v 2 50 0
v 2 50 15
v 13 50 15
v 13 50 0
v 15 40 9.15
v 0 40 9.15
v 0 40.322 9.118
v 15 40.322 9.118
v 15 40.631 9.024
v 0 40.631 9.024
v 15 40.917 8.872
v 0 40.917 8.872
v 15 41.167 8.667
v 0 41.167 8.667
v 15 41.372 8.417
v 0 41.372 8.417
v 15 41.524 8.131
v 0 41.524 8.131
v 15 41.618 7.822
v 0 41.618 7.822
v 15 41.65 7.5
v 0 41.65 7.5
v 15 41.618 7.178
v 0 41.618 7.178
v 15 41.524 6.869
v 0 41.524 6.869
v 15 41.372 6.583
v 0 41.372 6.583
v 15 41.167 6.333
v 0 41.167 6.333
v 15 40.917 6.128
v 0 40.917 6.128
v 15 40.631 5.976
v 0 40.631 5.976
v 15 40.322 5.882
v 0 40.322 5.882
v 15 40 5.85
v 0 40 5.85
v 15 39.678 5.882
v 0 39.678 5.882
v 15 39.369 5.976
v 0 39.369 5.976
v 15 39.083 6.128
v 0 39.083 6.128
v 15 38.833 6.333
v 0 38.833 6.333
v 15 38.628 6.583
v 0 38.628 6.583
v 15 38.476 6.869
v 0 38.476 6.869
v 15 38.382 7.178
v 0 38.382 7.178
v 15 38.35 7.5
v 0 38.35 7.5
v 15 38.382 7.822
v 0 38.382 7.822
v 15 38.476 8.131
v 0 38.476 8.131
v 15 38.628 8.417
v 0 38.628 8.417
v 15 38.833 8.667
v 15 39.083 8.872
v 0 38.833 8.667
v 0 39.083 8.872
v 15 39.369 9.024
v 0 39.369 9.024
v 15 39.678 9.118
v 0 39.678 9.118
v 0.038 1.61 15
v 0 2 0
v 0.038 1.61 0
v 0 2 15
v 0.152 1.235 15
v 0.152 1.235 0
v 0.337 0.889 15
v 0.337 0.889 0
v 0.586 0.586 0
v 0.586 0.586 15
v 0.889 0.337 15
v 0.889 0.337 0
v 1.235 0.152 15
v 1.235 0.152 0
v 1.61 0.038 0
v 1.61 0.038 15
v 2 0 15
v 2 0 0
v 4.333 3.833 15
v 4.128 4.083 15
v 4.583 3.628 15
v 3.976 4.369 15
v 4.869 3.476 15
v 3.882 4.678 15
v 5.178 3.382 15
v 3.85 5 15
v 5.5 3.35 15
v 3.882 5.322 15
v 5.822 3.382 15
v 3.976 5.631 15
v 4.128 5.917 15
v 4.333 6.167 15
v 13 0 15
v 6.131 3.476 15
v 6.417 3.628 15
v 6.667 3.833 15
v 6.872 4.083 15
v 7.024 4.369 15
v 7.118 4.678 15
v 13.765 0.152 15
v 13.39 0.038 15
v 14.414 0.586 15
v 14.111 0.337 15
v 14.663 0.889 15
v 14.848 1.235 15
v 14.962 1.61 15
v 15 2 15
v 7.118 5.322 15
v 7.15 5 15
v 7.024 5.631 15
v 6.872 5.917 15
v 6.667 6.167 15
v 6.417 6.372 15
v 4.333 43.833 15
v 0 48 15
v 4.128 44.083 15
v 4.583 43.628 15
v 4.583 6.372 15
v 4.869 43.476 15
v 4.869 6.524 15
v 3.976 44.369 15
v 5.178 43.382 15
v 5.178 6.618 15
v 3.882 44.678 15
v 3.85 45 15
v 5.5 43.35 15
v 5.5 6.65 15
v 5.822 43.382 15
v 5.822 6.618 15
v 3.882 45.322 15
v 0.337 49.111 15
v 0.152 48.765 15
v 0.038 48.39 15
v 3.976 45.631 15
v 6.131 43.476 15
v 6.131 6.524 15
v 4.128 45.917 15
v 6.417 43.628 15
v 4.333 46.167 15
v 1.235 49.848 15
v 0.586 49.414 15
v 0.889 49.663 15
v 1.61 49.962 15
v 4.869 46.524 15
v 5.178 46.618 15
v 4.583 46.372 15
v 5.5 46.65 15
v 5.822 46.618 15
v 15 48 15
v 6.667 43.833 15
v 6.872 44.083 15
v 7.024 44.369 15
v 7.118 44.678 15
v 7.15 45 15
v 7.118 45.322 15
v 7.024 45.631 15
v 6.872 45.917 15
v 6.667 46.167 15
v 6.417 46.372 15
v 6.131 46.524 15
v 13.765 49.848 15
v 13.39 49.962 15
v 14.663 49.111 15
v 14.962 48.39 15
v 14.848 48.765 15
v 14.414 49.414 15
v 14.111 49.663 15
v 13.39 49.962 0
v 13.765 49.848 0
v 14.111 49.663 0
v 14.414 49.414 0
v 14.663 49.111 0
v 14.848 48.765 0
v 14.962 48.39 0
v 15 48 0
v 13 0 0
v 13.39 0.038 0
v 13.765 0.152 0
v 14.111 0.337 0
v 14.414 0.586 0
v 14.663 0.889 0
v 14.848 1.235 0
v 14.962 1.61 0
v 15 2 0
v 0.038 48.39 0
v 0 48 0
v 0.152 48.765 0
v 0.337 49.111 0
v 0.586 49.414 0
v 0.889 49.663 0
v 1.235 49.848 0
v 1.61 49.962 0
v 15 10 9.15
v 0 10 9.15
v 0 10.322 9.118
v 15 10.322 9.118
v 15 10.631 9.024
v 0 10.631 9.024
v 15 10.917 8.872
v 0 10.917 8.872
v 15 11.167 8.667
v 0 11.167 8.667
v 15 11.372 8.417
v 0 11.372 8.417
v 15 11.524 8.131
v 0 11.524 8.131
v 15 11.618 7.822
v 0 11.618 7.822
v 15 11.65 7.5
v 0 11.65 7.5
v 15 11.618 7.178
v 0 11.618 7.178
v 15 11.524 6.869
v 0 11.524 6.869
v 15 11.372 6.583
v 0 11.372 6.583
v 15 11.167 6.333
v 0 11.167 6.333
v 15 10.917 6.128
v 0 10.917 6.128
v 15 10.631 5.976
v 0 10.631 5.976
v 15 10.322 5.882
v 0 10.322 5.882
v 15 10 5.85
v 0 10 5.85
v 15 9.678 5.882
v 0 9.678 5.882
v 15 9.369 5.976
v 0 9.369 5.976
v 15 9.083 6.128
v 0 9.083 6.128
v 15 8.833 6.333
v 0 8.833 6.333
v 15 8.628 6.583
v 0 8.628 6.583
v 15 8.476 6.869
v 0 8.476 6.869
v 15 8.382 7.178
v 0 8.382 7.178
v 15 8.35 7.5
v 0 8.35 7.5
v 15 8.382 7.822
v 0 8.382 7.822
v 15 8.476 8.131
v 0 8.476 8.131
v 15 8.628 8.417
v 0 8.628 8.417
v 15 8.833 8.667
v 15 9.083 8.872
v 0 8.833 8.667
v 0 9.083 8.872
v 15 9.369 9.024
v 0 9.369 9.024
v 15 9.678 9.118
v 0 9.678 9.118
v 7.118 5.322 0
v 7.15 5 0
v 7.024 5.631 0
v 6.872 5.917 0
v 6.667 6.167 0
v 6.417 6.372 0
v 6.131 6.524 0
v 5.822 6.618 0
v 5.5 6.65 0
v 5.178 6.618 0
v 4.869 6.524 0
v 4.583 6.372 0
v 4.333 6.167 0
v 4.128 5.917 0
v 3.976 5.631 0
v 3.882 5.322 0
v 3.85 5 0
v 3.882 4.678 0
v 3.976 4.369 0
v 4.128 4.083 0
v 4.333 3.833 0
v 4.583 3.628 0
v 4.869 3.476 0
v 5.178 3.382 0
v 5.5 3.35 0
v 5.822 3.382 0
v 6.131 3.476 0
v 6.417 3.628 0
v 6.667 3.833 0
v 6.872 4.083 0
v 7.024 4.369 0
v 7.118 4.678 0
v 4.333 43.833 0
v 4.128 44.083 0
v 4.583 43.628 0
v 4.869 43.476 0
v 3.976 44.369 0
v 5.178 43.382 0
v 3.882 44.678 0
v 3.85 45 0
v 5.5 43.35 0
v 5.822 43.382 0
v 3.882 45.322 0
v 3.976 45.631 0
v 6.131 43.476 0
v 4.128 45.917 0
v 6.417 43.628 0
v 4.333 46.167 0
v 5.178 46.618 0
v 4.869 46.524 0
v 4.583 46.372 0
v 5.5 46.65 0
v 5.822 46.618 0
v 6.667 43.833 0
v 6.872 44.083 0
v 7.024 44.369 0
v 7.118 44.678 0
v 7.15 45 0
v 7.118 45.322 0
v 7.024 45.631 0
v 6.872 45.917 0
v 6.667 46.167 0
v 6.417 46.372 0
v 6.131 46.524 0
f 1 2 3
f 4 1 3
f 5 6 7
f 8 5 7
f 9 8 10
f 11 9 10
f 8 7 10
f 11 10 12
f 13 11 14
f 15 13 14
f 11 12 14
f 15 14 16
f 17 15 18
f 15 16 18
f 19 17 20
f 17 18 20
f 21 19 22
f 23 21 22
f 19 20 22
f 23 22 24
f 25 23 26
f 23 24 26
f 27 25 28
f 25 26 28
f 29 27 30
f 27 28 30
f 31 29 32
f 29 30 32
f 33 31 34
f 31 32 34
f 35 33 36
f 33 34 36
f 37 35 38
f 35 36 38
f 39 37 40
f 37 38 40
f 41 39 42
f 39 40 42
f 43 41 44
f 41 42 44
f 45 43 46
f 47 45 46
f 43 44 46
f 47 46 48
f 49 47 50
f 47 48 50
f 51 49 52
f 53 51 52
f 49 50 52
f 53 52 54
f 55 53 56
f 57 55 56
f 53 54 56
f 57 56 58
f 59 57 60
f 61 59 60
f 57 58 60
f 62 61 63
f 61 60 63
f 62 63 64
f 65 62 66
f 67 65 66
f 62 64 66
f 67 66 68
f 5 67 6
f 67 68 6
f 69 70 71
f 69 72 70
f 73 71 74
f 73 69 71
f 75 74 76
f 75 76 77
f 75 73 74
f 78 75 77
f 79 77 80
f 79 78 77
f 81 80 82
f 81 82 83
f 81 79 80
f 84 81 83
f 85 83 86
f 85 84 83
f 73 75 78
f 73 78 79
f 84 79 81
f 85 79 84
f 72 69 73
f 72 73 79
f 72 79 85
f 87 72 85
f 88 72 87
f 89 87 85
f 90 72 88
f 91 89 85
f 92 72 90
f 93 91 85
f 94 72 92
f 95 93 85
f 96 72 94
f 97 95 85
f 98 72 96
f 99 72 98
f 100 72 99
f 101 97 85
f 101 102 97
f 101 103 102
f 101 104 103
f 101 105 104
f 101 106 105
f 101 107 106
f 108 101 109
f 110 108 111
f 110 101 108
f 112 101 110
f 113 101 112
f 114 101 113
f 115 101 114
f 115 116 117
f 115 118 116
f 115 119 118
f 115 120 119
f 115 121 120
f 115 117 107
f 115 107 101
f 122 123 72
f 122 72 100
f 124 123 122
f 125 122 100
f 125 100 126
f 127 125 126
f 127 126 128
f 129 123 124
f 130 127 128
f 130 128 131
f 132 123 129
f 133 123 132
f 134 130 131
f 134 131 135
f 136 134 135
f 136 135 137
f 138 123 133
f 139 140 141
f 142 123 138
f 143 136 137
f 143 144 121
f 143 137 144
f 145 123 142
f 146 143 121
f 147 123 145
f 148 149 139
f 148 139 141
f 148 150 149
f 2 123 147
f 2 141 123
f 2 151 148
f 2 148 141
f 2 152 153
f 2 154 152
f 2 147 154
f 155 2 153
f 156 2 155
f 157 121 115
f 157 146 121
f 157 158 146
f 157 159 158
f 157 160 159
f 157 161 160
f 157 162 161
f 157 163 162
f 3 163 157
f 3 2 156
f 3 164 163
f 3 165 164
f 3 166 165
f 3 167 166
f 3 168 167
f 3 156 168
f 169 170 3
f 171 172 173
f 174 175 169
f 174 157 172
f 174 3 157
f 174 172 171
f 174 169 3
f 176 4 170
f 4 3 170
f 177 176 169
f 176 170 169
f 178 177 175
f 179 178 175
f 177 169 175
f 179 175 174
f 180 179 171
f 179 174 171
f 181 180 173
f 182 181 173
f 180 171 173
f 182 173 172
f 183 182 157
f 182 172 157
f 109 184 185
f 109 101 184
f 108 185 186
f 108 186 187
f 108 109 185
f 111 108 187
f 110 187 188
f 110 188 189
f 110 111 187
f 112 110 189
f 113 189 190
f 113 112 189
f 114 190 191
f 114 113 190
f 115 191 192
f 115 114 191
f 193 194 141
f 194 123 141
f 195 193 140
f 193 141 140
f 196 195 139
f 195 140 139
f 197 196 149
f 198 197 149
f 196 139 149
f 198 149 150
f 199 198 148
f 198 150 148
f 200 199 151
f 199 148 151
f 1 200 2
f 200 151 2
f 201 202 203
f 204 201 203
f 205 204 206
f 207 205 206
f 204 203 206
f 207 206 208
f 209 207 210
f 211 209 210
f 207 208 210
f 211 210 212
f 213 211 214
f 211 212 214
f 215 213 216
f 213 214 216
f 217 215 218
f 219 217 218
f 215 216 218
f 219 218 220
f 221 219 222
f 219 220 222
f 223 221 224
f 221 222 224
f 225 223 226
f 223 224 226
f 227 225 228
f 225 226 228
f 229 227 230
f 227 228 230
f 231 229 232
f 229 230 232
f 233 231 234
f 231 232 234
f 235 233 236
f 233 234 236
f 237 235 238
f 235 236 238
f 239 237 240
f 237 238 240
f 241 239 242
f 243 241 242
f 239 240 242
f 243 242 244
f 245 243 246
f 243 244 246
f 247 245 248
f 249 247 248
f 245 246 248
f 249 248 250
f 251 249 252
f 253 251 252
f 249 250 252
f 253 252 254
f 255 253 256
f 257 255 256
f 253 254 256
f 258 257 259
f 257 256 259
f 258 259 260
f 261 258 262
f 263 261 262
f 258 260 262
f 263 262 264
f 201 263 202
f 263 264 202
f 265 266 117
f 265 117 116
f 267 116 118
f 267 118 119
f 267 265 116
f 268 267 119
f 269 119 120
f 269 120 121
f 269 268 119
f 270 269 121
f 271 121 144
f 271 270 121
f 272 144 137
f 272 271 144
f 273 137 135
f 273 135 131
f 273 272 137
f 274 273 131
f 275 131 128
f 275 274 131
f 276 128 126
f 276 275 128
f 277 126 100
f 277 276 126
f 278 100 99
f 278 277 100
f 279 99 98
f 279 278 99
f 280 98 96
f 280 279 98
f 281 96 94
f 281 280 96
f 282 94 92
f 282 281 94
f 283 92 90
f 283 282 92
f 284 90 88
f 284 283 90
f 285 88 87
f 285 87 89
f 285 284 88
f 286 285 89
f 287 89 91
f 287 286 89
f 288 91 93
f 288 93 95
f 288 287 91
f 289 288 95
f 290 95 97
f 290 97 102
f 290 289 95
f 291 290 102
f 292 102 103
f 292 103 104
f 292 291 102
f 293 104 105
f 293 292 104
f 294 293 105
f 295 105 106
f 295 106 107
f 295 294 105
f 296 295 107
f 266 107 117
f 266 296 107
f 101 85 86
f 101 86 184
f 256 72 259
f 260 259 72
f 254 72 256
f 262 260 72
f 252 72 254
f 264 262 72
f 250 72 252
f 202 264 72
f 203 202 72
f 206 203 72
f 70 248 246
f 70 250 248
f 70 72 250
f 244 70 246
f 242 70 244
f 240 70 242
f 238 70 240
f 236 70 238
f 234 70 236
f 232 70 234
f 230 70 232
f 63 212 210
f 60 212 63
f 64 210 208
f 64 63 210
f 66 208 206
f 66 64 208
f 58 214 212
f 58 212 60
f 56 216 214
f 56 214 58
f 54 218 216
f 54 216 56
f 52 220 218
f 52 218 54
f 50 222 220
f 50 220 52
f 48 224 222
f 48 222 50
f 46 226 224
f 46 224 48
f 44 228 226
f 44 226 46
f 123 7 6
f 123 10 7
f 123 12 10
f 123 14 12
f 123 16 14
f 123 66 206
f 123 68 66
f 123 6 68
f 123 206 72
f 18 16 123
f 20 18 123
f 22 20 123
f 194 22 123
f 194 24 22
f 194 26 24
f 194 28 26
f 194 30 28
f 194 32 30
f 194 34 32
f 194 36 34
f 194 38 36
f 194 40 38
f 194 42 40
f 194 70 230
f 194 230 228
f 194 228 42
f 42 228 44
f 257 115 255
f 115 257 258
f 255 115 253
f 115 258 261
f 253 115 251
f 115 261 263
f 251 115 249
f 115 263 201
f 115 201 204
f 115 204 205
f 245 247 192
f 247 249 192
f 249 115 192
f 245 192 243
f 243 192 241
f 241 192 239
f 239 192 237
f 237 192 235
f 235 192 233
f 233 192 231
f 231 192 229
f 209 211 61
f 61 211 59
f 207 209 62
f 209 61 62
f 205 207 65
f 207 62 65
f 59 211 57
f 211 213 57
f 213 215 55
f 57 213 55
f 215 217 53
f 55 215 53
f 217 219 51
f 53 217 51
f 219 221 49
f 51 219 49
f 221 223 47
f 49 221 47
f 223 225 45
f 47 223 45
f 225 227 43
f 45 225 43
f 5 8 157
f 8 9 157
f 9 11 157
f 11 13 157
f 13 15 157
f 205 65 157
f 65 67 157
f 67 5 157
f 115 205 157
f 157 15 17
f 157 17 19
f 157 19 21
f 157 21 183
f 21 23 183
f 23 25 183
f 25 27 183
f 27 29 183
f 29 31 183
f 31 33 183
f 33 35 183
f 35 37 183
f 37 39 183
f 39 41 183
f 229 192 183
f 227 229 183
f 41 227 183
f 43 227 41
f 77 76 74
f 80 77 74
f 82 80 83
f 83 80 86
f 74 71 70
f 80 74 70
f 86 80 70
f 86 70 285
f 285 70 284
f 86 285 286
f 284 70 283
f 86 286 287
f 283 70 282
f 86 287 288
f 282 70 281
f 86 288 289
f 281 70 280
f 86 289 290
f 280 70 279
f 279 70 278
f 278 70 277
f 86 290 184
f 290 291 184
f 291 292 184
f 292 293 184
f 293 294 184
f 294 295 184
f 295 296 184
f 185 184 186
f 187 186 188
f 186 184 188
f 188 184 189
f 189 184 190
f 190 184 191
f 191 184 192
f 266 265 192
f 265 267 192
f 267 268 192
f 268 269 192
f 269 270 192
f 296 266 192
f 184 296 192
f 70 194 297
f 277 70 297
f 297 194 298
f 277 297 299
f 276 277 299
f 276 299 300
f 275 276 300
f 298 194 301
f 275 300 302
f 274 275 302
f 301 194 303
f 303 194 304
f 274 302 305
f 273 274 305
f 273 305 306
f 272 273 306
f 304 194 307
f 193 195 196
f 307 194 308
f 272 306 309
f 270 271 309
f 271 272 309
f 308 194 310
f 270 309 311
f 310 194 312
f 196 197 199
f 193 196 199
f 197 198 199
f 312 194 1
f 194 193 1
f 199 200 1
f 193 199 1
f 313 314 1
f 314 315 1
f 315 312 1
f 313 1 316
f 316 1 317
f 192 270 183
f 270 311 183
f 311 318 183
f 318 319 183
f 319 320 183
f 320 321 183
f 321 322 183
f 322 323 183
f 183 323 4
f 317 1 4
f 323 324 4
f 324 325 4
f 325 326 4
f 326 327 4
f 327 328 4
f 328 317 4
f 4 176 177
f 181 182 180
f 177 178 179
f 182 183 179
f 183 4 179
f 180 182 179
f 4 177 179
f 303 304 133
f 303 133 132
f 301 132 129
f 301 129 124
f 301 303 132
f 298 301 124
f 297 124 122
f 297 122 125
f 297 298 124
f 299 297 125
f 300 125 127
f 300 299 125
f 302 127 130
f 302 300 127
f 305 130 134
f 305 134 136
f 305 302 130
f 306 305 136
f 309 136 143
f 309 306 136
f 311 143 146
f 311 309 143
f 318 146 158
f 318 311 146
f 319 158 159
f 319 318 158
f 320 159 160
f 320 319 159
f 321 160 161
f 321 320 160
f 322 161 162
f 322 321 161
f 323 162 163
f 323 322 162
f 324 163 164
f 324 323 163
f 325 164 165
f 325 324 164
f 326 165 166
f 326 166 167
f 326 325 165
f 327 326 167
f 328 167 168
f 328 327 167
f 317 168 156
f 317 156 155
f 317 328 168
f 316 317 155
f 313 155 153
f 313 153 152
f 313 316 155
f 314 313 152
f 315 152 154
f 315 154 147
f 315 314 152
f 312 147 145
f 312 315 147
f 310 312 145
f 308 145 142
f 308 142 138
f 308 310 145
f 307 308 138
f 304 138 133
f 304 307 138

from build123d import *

# Parameters (mm, degrees)
SKETCH_1_W          = 15
SKETCH_1_H          = 50
SKETCH_1_R          = 1.65
EXTRUDE_1_DEPTH     = 15
SKETCH_2_R          = 1.65
CUT_EXTRUDE_1_DEPTH = 15
FILLET_1_R          = 2


with BuildPart() as part:
    # ｽｹｯﾁ1 → ﾎﾞｽ - 押し出し1 (new body)
    with BuildSketch(Plane.XY):
        with Locations((7.5, 25)):
            Rectangle(SKETCH_1_W, SKETCH_1_H)
        with Locations((5.5, 5)):
            Circle(SKETCH_1_R, mode=Mode.SUBTRACT)
        with Locations(Location((5.5, 45, 0), (0, 0, 180))):
            Circle(SKETCH_1_R, mode=Mode.SUBTRACT)
    extrude(amount=EXTRUDE_1_DEPTH)

    # ｽｹｯﾁ2 → ｶｯﾄ - 押し出し1 (cut)
    with BuildSketch(Plane.ZY):
        with Locations((7.5, 40)):
            Circle(SKETCH_2_R)
        with Locations((7.5, 10)):
            Circle(SKETCH_2_R)
    extrude(amount=-CUT_EXTRUDE_1_DEPTH, mode=Mode.SUBTRACT)

    # ﾌｨﾚｯﾄ1
    fillet_1_edges = [part.edges().sort_by_distance(p)[0] for p in [
        (0, 50, 7.5),
        (15, 50, 7.5),
        (15, 0, 7.5),
        (0, 0, 7.5),
    ]]
    fillet(fillet_1_edges, radius=FILLET_1_R)


solid = part.part
